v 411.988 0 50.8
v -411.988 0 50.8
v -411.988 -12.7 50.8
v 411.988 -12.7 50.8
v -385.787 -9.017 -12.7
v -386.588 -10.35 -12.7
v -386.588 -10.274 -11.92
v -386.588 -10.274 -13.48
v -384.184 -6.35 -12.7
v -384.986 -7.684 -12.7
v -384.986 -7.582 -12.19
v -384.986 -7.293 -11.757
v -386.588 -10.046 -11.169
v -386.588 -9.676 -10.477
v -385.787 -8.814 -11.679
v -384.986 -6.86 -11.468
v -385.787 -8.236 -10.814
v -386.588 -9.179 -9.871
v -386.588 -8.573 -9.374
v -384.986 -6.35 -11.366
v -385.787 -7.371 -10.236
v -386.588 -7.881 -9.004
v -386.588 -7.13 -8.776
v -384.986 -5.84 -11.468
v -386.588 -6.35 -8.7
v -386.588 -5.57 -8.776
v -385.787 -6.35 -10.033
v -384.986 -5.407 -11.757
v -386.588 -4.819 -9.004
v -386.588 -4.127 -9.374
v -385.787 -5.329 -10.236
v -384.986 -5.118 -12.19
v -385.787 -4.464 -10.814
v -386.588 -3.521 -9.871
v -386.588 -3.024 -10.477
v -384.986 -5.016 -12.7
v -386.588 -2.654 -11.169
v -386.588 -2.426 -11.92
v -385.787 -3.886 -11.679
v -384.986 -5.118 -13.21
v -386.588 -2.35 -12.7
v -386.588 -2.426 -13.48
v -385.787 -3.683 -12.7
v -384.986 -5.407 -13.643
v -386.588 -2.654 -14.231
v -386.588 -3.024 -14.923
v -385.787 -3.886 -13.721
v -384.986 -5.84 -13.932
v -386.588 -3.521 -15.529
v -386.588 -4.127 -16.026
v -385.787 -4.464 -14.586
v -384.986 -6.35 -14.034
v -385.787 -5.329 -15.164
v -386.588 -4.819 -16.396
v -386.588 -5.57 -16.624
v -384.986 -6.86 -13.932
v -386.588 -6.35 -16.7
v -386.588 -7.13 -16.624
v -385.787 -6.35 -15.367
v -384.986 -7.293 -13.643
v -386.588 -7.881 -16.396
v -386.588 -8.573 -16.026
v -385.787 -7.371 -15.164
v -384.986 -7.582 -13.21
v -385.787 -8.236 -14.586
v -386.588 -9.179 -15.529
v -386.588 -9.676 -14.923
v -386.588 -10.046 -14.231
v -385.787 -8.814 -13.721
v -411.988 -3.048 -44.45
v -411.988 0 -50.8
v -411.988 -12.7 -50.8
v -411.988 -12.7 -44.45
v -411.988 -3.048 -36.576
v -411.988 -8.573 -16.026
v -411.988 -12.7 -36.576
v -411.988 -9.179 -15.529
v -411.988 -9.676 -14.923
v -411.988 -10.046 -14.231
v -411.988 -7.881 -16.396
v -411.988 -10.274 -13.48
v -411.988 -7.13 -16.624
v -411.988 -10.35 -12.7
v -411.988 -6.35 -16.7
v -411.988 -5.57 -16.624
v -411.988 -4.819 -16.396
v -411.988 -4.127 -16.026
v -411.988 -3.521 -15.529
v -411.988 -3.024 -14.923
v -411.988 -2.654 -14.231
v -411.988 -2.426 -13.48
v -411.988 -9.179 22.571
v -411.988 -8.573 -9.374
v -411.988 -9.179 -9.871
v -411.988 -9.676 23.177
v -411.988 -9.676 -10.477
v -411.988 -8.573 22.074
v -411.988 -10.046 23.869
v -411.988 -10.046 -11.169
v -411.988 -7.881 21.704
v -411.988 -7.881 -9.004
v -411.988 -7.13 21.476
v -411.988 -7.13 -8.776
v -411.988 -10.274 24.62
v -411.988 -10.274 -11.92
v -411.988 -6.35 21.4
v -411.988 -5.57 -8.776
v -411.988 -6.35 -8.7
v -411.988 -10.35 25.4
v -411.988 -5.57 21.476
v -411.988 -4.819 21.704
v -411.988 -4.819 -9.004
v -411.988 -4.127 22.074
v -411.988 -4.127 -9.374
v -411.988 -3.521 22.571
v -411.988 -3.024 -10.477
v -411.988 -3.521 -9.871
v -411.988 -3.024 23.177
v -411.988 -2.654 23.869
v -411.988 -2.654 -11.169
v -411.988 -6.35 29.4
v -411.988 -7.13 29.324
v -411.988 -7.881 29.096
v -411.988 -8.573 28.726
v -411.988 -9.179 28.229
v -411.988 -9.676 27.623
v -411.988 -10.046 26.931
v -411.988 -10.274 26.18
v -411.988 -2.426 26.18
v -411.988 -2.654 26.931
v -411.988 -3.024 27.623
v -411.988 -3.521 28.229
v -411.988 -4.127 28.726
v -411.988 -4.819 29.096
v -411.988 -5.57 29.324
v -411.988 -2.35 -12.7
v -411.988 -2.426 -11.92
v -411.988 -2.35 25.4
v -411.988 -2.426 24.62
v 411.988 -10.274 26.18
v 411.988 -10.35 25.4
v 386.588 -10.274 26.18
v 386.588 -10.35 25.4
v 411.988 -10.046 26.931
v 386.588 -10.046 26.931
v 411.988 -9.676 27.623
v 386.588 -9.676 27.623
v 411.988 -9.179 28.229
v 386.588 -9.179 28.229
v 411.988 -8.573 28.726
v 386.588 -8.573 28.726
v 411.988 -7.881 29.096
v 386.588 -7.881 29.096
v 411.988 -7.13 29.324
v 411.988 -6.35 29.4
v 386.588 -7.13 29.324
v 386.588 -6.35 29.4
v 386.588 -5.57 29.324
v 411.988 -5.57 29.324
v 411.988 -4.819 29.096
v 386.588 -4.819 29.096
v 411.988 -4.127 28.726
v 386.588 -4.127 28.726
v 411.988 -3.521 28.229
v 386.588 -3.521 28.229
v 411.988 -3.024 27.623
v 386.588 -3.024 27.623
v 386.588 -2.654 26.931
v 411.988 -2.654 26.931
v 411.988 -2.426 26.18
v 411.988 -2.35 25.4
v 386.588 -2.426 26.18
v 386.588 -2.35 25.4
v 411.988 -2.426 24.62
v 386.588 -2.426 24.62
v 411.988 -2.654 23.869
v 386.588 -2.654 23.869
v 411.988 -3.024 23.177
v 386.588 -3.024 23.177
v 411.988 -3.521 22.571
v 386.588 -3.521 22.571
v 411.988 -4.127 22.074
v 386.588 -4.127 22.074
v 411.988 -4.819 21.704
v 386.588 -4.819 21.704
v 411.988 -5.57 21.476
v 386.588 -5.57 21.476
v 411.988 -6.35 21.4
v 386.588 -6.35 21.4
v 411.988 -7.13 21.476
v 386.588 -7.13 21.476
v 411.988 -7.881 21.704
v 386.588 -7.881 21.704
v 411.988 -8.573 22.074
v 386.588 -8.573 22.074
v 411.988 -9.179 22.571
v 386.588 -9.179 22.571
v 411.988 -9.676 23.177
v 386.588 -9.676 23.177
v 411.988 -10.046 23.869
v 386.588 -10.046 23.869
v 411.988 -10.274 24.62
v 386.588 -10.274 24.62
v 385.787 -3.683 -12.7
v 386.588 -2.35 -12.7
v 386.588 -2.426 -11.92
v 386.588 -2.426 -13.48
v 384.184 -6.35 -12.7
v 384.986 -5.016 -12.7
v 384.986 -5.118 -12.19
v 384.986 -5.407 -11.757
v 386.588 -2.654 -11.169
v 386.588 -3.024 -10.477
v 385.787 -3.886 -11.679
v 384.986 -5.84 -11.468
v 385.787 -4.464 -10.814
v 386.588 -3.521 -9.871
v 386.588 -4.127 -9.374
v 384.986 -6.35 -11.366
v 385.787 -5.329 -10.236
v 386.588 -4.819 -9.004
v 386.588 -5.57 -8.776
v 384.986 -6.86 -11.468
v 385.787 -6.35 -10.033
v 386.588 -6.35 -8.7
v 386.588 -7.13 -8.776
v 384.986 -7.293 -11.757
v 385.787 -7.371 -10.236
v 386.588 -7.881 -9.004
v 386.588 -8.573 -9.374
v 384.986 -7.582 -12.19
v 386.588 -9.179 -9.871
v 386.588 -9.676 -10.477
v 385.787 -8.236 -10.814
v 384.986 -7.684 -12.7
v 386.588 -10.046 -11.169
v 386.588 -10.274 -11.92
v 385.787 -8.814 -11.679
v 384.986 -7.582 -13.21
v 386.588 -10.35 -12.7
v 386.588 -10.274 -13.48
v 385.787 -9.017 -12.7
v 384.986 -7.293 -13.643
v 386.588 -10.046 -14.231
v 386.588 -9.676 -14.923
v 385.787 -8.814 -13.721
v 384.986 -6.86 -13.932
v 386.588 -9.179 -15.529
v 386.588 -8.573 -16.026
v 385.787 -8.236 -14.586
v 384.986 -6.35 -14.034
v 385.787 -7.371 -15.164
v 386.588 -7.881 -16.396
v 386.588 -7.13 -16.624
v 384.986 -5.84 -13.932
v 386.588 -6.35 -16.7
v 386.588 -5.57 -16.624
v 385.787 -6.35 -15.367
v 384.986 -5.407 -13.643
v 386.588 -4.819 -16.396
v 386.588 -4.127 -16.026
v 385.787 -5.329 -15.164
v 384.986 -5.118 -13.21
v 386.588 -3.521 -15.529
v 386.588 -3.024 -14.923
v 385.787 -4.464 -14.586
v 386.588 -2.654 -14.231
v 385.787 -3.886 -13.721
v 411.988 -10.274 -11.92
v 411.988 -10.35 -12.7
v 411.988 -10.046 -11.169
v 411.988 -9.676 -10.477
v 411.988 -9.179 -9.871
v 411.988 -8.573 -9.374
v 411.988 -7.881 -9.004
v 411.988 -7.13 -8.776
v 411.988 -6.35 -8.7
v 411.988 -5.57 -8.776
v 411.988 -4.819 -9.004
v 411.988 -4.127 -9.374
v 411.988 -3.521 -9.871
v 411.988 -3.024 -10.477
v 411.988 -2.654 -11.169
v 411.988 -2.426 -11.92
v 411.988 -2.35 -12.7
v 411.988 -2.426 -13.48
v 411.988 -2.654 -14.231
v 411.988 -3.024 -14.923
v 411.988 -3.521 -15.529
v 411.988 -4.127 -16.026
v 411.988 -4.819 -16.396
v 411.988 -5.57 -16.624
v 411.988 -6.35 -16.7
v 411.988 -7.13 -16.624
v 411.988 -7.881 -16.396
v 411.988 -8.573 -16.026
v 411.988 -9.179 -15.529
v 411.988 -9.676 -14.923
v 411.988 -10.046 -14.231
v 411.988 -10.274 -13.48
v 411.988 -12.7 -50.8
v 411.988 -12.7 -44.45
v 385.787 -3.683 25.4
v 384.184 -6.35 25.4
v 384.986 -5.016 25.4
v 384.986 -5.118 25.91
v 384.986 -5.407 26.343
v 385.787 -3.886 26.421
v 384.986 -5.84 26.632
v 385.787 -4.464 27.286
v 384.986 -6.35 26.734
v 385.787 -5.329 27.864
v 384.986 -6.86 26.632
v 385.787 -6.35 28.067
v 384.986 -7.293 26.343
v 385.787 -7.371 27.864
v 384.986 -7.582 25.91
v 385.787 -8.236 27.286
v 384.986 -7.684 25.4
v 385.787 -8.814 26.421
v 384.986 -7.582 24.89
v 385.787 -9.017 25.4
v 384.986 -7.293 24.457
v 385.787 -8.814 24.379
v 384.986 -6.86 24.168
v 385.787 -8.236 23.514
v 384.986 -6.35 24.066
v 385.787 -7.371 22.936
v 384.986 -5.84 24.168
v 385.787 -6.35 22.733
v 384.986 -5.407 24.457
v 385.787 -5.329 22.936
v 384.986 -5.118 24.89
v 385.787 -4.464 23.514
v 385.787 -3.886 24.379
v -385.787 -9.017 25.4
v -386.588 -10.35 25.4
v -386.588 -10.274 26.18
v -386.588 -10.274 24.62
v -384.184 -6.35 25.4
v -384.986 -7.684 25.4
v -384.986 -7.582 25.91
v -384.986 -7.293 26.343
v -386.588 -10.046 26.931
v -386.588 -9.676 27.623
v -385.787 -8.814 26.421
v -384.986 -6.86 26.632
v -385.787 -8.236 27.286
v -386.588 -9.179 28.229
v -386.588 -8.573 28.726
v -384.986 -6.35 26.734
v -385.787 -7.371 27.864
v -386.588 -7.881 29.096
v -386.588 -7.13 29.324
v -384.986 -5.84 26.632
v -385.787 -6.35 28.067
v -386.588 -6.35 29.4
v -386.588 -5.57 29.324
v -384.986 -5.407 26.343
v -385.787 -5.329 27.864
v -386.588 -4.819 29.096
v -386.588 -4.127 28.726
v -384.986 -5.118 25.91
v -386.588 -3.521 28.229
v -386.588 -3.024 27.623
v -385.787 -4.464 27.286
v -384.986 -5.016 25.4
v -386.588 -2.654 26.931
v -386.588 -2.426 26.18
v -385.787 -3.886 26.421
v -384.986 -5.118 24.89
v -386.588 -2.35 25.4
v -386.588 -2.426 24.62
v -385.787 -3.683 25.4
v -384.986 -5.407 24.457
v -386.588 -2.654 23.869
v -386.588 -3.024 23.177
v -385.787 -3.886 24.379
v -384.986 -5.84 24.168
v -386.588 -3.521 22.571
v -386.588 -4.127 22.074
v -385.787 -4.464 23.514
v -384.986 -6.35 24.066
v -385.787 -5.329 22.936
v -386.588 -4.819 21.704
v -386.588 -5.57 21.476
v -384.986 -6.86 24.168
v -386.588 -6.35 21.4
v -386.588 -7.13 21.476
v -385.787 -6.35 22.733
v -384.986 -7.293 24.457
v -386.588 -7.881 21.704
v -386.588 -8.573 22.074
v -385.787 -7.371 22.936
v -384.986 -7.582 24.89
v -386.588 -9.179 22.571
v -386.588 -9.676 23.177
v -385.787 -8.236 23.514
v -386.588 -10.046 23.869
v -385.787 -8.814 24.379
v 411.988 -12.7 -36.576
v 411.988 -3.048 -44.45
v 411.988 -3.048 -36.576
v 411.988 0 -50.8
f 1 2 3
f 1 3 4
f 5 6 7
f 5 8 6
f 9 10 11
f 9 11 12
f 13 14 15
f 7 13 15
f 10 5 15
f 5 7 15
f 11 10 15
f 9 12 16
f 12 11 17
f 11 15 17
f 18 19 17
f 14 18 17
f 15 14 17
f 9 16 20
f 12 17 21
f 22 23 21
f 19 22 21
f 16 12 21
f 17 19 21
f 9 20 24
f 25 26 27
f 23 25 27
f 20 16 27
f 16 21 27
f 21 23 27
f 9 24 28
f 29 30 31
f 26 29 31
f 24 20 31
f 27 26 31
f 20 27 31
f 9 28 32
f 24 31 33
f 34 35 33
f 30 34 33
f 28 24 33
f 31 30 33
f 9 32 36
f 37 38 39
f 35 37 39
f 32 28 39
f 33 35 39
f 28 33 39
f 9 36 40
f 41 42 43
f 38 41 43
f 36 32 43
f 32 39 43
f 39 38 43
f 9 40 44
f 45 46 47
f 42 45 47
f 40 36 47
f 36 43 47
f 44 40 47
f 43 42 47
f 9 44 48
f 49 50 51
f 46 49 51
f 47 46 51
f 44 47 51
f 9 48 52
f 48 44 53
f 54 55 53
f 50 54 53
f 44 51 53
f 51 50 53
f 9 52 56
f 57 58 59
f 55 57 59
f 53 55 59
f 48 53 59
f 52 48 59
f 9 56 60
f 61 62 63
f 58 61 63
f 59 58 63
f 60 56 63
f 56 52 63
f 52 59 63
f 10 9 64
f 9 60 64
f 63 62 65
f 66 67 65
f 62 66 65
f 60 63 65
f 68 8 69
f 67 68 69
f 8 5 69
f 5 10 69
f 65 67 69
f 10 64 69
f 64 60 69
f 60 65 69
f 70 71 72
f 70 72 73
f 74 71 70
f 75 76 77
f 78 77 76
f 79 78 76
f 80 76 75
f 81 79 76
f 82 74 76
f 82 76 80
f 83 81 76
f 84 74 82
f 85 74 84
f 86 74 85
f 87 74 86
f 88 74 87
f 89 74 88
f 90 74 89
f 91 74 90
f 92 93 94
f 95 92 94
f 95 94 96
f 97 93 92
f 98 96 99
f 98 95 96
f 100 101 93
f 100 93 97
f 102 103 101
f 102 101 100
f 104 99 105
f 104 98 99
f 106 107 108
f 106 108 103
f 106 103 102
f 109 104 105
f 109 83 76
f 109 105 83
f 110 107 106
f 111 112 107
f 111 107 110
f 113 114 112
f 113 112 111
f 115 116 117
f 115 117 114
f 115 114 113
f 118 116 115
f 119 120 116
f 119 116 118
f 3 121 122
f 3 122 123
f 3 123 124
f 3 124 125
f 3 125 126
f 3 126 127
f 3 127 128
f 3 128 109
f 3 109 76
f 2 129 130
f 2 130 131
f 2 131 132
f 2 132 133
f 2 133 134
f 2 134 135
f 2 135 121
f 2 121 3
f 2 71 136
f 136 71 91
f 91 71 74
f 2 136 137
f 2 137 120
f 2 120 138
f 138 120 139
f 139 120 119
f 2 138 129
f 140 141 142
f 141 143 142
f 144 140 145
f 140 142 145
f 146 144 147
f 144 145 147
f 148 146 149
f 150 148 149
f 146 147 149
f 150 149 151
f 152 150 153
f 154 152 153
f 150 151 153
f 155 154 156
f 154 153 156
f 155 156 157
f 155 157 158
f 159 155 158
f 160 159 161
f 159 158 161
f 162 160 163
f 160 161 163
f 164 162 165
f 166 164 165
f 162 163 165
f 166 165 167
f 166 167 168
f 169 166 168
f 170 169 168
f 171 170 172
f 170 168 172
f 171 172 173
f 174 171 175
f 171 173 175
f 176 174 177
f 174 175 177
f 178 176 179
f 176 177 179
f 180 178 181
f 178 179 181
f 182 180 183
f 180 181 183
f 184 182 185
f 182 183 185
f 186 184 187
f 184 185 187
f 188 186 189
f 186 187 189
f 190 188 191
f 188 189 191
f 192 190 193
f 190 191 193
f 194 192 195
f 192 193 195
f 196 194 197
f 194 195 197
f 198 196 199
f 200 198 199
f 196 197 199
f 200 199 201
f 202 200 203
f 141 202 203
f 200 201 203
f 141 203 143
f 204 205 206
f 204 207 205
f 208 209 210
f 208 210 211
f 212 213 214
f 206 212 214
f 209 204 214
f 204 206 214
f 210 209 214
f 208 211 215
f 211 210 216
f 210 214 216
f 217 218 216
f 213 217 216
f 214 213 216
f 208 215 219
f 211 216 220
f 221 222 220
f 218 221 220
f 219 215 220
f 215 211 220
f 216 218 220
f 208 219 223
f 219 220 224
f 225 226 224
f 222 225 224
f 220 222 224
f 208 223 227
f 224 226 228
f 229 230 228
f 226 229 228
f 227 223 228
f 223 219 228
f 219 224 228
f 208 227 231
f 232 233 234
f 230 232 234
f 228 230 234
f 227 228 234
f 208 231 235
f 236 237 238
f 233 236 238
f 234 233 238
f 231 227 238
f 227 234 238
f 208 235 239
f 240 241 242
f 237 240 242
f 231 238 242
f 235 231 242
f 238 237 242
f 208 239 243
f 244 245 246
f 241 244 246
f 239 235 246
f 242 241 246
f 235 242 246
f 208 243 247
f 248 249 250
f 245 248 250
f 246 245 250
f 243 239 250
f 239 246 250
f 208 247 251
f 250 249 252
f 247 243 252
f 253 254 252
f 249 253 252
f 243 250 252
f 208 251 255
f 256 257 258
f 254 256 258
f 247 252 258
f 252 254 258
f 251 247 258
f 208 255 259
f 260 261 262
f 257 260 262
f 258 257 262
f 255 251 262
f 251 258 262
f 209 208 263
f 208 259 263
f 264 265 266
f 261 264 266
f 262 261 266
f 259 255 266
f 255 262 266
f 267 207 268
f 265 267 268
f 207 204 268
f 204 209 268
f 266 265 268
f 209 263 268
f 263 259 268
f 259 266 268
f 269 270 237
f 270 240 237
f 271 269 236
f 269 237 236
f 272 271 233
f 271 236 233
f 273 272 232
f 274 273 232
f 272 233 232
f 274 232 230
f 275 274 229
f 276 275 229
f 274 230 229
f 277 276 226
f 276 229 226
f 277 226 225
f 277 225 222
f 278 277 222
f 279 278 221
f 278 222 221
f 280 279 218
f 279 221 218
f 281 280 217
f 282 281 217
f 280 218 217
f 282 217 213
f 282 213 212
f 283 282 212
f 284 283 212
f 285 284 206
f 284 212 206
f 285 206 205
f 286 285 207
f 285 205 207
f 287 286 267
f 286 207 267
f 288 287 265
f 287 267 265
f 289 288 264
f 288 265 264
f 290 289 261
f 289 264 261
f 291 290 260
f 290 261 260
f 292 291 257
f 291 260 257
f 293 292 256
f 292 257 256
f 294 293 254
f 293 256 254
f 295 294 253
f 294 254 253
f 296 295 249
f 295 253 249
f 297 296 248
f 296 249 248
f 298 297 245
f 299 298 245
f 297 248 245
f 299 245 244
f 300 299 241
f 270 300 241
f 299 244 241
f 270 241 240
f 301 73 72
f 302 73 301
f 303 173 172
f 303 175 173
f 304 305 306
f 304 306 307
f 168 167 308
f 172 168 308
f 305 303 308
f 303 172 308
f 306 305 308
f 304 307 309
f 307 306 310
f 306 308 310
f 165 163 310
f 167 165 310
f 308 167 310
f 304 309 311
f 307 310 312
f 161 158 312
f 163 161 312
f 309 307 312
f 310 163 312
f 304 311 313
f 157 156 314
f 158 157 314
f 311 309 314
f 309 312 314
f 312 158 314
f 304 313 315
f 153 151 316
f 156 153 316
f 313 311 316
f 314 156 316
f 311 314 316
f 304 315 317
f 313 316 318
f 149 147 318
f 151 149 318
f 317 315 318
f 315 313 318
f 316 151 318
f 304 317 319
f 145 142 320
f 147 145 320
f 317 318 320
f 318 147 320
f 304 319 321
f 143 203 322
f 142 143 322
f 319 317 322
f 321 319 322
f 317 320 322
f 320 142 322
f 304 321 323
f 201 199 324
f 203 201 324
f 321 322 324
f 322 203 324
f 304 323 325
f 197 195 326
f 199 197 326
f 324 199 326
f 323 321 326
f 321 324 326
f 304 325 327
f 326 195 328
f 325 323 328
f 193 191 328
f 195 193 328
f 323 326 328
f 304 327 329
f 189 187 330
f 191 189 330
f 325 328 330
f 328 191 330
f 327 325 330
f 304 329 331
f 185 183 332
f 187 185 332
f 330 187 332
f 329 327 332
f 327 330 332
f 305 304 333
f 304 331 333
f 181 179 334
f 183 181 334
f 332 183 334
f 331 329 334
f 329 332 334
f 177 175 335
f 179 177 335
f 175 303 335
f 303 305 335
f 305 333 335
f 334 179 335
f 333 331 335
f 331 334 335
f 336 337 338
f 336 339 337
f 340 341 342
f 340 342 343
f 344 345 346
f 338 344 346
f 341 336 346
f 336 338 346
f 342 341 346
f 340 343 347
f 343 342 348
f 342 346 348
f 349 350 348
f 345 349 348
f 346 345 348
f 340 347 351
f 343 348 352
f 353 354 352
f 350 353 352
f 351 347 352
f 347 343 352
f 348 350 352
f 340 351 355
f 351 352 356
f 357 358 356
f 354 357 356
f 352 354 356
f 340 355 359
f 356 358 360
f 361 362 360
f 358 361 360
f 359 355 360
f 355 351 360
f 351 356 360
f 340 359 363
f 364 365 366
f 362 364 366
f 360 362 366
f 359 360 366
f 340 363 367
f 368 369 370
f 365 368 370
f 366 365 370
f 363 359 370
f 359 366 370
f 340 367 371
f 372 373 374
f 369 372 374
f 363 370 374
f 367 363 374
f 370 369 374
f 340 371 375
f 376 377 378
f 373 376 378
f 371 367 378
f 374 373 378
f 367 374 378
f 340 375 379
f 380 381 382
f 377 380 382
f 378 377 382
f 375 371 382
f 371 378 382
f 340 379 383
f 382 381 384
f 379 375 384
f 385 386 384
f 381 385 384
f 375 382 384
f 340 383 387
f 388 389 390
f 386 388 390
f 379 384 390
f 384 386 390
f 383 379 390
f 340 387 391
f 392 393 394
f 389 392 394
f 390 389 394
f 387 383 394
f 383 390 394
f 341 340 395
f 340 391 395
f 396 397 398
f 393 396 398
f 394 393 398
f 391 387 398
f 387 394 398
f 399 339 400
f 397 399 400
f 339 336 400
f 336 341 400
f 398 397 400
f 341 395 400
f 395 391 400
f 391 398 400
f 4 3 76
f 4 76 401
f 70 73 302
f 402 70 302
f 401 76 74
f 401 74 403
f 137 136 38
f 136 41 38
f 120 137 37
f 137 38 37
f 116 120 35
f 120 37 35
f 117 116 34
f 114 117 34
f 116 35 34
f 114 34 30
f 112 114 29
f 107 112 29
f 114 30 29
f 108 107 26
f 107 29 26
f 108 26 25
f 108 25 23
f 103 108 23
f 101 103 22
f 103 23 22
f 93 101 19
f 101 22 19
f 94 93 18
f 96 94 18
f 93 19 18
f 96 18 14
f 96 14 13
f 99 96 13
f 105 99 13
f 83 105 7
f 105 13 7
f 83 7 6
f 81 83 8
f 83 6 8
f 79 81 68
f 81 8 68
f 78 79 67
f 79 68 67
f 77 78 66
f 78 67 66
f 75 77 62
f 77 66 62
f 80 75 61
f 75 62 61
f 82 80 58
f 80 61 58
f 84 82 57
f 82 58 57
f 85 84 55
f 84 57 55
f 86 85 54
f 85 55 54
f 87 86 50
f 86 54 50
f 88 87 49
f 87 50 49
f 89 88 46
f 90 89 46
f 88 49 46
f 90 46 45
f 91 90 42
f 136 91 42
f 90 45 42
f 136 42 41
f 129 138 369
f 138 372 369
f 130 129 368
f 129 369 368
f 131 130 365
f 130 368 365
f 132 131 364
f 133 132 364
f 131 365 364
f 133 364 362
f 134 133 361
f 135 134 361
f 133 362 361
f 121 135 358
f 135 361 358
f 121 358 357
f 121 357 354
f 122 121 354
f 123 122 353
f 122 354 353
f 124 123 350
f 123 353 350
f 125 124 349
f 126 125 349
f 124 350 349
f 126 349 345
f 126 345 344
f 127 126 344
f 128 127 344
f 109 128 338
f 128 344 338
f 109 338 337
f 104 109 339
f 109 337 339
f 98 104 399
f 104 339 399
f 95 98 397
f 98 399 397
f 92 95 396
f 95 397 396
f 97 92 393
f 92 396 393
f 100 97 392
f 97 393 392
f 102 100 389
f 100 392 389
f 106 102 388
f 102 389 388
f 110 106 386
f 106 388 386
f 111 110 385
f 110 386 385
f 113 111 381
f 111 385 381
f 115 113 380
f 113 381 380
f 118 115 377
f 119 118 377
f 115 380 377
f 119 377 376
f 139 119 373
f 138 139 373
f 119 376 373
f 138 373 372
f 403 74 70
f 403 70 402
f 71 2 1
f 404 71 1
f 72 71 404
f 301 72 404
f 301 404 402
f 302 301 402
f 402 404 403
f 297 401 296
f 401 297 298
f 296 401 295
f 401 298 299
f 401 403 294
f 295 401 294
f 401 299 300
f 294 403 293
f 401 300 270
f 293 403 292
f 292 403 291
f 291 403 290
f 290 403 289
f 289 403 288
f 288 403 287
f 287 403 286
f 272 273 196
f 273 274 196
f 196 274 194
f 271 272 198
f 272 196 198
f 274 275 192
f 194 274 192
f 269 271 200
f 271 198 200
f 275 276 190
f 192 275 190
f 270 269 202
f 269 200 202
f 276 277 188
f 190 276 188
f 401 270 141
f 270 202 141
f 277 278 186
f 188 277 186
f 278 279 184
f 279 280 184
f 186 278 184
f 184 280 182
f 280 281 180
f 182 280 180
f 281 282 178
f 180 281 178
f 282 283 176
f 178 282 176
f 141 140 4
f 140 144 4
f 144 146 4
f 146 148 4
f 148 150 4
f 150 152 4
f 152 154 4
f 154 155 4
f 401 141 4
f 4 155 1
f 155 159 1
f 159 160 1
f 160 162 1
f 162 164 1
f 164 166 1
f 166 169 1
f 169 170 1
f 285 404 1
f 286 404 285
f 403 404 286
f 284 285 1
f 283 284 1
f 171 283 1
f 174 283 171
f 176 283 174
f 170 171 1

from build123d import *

# Parameters (mm, degrees)
F0_W     = 823.976
F0_H     = 101.6
F1_DEPTH = 12.7
F2_W     = 823.976
F2_H     = 7.874
F3_DEPTH = 9.652
F5_D     = 8.001
F5_DEPTH = 25.4
F5_TIP   = 2.4037429064
F7_D     = 8.001
F7_DEPTH = 25.4
F7_TIP   = 2.4037429064


# Not quite as in the source:
# - a feature names something its author has since deleted; it is built from what else it names


with BuildPart() as f1:
    # F0 (on Front) → F1 (new body)
    with BuildSketch(Plane.XZ):
        Rectangle(F0_W, F0_H)
    extrude(amount=F1_DEPTH)

    # F2 (on face) → F3 (cut)
    with BuildSketch(Plane.XZ.offset(12.7)):
        with Locations((0, -40.513)):
            Rectangle(F2_W, F2_H)
    extrude(amount=-F3_DEPTH, mode=Mode.SUBTRACT)

    # F5
    with Locations(Plane(origin=(-411.988, 0, 0), x_dir=(0, -1, 0), z_dir=(-1, 0, 0))):
        with Locations((6.35, 25.4), (6.35, -12.7)):
            Hole(F5_D / 2, depth=F5_DEPTH)
            with Locations((0, 0, -(F5_DEPTH + F5_TIP / 2))):  # 118° drill point
                Cone(0, F5_D / 2, F5_TIP, mode=Mode.SUBTRACT)

    # F7
    with Locations(Plane.YZ.offset(411.988)):
        with Locations((-6.35, 25.4), (-6.35, -12.7)):
            Hole(F7_D / 2, depth=F7_DEPTH)
            with Locations((0, 0, -(F7_DEPTH + F7_TIP / 2))):  # 118° drill point
                Cone(0, F7_D / 2, F7_TIP, mode=Mode.SUBTRACT)


solid = f1.part
